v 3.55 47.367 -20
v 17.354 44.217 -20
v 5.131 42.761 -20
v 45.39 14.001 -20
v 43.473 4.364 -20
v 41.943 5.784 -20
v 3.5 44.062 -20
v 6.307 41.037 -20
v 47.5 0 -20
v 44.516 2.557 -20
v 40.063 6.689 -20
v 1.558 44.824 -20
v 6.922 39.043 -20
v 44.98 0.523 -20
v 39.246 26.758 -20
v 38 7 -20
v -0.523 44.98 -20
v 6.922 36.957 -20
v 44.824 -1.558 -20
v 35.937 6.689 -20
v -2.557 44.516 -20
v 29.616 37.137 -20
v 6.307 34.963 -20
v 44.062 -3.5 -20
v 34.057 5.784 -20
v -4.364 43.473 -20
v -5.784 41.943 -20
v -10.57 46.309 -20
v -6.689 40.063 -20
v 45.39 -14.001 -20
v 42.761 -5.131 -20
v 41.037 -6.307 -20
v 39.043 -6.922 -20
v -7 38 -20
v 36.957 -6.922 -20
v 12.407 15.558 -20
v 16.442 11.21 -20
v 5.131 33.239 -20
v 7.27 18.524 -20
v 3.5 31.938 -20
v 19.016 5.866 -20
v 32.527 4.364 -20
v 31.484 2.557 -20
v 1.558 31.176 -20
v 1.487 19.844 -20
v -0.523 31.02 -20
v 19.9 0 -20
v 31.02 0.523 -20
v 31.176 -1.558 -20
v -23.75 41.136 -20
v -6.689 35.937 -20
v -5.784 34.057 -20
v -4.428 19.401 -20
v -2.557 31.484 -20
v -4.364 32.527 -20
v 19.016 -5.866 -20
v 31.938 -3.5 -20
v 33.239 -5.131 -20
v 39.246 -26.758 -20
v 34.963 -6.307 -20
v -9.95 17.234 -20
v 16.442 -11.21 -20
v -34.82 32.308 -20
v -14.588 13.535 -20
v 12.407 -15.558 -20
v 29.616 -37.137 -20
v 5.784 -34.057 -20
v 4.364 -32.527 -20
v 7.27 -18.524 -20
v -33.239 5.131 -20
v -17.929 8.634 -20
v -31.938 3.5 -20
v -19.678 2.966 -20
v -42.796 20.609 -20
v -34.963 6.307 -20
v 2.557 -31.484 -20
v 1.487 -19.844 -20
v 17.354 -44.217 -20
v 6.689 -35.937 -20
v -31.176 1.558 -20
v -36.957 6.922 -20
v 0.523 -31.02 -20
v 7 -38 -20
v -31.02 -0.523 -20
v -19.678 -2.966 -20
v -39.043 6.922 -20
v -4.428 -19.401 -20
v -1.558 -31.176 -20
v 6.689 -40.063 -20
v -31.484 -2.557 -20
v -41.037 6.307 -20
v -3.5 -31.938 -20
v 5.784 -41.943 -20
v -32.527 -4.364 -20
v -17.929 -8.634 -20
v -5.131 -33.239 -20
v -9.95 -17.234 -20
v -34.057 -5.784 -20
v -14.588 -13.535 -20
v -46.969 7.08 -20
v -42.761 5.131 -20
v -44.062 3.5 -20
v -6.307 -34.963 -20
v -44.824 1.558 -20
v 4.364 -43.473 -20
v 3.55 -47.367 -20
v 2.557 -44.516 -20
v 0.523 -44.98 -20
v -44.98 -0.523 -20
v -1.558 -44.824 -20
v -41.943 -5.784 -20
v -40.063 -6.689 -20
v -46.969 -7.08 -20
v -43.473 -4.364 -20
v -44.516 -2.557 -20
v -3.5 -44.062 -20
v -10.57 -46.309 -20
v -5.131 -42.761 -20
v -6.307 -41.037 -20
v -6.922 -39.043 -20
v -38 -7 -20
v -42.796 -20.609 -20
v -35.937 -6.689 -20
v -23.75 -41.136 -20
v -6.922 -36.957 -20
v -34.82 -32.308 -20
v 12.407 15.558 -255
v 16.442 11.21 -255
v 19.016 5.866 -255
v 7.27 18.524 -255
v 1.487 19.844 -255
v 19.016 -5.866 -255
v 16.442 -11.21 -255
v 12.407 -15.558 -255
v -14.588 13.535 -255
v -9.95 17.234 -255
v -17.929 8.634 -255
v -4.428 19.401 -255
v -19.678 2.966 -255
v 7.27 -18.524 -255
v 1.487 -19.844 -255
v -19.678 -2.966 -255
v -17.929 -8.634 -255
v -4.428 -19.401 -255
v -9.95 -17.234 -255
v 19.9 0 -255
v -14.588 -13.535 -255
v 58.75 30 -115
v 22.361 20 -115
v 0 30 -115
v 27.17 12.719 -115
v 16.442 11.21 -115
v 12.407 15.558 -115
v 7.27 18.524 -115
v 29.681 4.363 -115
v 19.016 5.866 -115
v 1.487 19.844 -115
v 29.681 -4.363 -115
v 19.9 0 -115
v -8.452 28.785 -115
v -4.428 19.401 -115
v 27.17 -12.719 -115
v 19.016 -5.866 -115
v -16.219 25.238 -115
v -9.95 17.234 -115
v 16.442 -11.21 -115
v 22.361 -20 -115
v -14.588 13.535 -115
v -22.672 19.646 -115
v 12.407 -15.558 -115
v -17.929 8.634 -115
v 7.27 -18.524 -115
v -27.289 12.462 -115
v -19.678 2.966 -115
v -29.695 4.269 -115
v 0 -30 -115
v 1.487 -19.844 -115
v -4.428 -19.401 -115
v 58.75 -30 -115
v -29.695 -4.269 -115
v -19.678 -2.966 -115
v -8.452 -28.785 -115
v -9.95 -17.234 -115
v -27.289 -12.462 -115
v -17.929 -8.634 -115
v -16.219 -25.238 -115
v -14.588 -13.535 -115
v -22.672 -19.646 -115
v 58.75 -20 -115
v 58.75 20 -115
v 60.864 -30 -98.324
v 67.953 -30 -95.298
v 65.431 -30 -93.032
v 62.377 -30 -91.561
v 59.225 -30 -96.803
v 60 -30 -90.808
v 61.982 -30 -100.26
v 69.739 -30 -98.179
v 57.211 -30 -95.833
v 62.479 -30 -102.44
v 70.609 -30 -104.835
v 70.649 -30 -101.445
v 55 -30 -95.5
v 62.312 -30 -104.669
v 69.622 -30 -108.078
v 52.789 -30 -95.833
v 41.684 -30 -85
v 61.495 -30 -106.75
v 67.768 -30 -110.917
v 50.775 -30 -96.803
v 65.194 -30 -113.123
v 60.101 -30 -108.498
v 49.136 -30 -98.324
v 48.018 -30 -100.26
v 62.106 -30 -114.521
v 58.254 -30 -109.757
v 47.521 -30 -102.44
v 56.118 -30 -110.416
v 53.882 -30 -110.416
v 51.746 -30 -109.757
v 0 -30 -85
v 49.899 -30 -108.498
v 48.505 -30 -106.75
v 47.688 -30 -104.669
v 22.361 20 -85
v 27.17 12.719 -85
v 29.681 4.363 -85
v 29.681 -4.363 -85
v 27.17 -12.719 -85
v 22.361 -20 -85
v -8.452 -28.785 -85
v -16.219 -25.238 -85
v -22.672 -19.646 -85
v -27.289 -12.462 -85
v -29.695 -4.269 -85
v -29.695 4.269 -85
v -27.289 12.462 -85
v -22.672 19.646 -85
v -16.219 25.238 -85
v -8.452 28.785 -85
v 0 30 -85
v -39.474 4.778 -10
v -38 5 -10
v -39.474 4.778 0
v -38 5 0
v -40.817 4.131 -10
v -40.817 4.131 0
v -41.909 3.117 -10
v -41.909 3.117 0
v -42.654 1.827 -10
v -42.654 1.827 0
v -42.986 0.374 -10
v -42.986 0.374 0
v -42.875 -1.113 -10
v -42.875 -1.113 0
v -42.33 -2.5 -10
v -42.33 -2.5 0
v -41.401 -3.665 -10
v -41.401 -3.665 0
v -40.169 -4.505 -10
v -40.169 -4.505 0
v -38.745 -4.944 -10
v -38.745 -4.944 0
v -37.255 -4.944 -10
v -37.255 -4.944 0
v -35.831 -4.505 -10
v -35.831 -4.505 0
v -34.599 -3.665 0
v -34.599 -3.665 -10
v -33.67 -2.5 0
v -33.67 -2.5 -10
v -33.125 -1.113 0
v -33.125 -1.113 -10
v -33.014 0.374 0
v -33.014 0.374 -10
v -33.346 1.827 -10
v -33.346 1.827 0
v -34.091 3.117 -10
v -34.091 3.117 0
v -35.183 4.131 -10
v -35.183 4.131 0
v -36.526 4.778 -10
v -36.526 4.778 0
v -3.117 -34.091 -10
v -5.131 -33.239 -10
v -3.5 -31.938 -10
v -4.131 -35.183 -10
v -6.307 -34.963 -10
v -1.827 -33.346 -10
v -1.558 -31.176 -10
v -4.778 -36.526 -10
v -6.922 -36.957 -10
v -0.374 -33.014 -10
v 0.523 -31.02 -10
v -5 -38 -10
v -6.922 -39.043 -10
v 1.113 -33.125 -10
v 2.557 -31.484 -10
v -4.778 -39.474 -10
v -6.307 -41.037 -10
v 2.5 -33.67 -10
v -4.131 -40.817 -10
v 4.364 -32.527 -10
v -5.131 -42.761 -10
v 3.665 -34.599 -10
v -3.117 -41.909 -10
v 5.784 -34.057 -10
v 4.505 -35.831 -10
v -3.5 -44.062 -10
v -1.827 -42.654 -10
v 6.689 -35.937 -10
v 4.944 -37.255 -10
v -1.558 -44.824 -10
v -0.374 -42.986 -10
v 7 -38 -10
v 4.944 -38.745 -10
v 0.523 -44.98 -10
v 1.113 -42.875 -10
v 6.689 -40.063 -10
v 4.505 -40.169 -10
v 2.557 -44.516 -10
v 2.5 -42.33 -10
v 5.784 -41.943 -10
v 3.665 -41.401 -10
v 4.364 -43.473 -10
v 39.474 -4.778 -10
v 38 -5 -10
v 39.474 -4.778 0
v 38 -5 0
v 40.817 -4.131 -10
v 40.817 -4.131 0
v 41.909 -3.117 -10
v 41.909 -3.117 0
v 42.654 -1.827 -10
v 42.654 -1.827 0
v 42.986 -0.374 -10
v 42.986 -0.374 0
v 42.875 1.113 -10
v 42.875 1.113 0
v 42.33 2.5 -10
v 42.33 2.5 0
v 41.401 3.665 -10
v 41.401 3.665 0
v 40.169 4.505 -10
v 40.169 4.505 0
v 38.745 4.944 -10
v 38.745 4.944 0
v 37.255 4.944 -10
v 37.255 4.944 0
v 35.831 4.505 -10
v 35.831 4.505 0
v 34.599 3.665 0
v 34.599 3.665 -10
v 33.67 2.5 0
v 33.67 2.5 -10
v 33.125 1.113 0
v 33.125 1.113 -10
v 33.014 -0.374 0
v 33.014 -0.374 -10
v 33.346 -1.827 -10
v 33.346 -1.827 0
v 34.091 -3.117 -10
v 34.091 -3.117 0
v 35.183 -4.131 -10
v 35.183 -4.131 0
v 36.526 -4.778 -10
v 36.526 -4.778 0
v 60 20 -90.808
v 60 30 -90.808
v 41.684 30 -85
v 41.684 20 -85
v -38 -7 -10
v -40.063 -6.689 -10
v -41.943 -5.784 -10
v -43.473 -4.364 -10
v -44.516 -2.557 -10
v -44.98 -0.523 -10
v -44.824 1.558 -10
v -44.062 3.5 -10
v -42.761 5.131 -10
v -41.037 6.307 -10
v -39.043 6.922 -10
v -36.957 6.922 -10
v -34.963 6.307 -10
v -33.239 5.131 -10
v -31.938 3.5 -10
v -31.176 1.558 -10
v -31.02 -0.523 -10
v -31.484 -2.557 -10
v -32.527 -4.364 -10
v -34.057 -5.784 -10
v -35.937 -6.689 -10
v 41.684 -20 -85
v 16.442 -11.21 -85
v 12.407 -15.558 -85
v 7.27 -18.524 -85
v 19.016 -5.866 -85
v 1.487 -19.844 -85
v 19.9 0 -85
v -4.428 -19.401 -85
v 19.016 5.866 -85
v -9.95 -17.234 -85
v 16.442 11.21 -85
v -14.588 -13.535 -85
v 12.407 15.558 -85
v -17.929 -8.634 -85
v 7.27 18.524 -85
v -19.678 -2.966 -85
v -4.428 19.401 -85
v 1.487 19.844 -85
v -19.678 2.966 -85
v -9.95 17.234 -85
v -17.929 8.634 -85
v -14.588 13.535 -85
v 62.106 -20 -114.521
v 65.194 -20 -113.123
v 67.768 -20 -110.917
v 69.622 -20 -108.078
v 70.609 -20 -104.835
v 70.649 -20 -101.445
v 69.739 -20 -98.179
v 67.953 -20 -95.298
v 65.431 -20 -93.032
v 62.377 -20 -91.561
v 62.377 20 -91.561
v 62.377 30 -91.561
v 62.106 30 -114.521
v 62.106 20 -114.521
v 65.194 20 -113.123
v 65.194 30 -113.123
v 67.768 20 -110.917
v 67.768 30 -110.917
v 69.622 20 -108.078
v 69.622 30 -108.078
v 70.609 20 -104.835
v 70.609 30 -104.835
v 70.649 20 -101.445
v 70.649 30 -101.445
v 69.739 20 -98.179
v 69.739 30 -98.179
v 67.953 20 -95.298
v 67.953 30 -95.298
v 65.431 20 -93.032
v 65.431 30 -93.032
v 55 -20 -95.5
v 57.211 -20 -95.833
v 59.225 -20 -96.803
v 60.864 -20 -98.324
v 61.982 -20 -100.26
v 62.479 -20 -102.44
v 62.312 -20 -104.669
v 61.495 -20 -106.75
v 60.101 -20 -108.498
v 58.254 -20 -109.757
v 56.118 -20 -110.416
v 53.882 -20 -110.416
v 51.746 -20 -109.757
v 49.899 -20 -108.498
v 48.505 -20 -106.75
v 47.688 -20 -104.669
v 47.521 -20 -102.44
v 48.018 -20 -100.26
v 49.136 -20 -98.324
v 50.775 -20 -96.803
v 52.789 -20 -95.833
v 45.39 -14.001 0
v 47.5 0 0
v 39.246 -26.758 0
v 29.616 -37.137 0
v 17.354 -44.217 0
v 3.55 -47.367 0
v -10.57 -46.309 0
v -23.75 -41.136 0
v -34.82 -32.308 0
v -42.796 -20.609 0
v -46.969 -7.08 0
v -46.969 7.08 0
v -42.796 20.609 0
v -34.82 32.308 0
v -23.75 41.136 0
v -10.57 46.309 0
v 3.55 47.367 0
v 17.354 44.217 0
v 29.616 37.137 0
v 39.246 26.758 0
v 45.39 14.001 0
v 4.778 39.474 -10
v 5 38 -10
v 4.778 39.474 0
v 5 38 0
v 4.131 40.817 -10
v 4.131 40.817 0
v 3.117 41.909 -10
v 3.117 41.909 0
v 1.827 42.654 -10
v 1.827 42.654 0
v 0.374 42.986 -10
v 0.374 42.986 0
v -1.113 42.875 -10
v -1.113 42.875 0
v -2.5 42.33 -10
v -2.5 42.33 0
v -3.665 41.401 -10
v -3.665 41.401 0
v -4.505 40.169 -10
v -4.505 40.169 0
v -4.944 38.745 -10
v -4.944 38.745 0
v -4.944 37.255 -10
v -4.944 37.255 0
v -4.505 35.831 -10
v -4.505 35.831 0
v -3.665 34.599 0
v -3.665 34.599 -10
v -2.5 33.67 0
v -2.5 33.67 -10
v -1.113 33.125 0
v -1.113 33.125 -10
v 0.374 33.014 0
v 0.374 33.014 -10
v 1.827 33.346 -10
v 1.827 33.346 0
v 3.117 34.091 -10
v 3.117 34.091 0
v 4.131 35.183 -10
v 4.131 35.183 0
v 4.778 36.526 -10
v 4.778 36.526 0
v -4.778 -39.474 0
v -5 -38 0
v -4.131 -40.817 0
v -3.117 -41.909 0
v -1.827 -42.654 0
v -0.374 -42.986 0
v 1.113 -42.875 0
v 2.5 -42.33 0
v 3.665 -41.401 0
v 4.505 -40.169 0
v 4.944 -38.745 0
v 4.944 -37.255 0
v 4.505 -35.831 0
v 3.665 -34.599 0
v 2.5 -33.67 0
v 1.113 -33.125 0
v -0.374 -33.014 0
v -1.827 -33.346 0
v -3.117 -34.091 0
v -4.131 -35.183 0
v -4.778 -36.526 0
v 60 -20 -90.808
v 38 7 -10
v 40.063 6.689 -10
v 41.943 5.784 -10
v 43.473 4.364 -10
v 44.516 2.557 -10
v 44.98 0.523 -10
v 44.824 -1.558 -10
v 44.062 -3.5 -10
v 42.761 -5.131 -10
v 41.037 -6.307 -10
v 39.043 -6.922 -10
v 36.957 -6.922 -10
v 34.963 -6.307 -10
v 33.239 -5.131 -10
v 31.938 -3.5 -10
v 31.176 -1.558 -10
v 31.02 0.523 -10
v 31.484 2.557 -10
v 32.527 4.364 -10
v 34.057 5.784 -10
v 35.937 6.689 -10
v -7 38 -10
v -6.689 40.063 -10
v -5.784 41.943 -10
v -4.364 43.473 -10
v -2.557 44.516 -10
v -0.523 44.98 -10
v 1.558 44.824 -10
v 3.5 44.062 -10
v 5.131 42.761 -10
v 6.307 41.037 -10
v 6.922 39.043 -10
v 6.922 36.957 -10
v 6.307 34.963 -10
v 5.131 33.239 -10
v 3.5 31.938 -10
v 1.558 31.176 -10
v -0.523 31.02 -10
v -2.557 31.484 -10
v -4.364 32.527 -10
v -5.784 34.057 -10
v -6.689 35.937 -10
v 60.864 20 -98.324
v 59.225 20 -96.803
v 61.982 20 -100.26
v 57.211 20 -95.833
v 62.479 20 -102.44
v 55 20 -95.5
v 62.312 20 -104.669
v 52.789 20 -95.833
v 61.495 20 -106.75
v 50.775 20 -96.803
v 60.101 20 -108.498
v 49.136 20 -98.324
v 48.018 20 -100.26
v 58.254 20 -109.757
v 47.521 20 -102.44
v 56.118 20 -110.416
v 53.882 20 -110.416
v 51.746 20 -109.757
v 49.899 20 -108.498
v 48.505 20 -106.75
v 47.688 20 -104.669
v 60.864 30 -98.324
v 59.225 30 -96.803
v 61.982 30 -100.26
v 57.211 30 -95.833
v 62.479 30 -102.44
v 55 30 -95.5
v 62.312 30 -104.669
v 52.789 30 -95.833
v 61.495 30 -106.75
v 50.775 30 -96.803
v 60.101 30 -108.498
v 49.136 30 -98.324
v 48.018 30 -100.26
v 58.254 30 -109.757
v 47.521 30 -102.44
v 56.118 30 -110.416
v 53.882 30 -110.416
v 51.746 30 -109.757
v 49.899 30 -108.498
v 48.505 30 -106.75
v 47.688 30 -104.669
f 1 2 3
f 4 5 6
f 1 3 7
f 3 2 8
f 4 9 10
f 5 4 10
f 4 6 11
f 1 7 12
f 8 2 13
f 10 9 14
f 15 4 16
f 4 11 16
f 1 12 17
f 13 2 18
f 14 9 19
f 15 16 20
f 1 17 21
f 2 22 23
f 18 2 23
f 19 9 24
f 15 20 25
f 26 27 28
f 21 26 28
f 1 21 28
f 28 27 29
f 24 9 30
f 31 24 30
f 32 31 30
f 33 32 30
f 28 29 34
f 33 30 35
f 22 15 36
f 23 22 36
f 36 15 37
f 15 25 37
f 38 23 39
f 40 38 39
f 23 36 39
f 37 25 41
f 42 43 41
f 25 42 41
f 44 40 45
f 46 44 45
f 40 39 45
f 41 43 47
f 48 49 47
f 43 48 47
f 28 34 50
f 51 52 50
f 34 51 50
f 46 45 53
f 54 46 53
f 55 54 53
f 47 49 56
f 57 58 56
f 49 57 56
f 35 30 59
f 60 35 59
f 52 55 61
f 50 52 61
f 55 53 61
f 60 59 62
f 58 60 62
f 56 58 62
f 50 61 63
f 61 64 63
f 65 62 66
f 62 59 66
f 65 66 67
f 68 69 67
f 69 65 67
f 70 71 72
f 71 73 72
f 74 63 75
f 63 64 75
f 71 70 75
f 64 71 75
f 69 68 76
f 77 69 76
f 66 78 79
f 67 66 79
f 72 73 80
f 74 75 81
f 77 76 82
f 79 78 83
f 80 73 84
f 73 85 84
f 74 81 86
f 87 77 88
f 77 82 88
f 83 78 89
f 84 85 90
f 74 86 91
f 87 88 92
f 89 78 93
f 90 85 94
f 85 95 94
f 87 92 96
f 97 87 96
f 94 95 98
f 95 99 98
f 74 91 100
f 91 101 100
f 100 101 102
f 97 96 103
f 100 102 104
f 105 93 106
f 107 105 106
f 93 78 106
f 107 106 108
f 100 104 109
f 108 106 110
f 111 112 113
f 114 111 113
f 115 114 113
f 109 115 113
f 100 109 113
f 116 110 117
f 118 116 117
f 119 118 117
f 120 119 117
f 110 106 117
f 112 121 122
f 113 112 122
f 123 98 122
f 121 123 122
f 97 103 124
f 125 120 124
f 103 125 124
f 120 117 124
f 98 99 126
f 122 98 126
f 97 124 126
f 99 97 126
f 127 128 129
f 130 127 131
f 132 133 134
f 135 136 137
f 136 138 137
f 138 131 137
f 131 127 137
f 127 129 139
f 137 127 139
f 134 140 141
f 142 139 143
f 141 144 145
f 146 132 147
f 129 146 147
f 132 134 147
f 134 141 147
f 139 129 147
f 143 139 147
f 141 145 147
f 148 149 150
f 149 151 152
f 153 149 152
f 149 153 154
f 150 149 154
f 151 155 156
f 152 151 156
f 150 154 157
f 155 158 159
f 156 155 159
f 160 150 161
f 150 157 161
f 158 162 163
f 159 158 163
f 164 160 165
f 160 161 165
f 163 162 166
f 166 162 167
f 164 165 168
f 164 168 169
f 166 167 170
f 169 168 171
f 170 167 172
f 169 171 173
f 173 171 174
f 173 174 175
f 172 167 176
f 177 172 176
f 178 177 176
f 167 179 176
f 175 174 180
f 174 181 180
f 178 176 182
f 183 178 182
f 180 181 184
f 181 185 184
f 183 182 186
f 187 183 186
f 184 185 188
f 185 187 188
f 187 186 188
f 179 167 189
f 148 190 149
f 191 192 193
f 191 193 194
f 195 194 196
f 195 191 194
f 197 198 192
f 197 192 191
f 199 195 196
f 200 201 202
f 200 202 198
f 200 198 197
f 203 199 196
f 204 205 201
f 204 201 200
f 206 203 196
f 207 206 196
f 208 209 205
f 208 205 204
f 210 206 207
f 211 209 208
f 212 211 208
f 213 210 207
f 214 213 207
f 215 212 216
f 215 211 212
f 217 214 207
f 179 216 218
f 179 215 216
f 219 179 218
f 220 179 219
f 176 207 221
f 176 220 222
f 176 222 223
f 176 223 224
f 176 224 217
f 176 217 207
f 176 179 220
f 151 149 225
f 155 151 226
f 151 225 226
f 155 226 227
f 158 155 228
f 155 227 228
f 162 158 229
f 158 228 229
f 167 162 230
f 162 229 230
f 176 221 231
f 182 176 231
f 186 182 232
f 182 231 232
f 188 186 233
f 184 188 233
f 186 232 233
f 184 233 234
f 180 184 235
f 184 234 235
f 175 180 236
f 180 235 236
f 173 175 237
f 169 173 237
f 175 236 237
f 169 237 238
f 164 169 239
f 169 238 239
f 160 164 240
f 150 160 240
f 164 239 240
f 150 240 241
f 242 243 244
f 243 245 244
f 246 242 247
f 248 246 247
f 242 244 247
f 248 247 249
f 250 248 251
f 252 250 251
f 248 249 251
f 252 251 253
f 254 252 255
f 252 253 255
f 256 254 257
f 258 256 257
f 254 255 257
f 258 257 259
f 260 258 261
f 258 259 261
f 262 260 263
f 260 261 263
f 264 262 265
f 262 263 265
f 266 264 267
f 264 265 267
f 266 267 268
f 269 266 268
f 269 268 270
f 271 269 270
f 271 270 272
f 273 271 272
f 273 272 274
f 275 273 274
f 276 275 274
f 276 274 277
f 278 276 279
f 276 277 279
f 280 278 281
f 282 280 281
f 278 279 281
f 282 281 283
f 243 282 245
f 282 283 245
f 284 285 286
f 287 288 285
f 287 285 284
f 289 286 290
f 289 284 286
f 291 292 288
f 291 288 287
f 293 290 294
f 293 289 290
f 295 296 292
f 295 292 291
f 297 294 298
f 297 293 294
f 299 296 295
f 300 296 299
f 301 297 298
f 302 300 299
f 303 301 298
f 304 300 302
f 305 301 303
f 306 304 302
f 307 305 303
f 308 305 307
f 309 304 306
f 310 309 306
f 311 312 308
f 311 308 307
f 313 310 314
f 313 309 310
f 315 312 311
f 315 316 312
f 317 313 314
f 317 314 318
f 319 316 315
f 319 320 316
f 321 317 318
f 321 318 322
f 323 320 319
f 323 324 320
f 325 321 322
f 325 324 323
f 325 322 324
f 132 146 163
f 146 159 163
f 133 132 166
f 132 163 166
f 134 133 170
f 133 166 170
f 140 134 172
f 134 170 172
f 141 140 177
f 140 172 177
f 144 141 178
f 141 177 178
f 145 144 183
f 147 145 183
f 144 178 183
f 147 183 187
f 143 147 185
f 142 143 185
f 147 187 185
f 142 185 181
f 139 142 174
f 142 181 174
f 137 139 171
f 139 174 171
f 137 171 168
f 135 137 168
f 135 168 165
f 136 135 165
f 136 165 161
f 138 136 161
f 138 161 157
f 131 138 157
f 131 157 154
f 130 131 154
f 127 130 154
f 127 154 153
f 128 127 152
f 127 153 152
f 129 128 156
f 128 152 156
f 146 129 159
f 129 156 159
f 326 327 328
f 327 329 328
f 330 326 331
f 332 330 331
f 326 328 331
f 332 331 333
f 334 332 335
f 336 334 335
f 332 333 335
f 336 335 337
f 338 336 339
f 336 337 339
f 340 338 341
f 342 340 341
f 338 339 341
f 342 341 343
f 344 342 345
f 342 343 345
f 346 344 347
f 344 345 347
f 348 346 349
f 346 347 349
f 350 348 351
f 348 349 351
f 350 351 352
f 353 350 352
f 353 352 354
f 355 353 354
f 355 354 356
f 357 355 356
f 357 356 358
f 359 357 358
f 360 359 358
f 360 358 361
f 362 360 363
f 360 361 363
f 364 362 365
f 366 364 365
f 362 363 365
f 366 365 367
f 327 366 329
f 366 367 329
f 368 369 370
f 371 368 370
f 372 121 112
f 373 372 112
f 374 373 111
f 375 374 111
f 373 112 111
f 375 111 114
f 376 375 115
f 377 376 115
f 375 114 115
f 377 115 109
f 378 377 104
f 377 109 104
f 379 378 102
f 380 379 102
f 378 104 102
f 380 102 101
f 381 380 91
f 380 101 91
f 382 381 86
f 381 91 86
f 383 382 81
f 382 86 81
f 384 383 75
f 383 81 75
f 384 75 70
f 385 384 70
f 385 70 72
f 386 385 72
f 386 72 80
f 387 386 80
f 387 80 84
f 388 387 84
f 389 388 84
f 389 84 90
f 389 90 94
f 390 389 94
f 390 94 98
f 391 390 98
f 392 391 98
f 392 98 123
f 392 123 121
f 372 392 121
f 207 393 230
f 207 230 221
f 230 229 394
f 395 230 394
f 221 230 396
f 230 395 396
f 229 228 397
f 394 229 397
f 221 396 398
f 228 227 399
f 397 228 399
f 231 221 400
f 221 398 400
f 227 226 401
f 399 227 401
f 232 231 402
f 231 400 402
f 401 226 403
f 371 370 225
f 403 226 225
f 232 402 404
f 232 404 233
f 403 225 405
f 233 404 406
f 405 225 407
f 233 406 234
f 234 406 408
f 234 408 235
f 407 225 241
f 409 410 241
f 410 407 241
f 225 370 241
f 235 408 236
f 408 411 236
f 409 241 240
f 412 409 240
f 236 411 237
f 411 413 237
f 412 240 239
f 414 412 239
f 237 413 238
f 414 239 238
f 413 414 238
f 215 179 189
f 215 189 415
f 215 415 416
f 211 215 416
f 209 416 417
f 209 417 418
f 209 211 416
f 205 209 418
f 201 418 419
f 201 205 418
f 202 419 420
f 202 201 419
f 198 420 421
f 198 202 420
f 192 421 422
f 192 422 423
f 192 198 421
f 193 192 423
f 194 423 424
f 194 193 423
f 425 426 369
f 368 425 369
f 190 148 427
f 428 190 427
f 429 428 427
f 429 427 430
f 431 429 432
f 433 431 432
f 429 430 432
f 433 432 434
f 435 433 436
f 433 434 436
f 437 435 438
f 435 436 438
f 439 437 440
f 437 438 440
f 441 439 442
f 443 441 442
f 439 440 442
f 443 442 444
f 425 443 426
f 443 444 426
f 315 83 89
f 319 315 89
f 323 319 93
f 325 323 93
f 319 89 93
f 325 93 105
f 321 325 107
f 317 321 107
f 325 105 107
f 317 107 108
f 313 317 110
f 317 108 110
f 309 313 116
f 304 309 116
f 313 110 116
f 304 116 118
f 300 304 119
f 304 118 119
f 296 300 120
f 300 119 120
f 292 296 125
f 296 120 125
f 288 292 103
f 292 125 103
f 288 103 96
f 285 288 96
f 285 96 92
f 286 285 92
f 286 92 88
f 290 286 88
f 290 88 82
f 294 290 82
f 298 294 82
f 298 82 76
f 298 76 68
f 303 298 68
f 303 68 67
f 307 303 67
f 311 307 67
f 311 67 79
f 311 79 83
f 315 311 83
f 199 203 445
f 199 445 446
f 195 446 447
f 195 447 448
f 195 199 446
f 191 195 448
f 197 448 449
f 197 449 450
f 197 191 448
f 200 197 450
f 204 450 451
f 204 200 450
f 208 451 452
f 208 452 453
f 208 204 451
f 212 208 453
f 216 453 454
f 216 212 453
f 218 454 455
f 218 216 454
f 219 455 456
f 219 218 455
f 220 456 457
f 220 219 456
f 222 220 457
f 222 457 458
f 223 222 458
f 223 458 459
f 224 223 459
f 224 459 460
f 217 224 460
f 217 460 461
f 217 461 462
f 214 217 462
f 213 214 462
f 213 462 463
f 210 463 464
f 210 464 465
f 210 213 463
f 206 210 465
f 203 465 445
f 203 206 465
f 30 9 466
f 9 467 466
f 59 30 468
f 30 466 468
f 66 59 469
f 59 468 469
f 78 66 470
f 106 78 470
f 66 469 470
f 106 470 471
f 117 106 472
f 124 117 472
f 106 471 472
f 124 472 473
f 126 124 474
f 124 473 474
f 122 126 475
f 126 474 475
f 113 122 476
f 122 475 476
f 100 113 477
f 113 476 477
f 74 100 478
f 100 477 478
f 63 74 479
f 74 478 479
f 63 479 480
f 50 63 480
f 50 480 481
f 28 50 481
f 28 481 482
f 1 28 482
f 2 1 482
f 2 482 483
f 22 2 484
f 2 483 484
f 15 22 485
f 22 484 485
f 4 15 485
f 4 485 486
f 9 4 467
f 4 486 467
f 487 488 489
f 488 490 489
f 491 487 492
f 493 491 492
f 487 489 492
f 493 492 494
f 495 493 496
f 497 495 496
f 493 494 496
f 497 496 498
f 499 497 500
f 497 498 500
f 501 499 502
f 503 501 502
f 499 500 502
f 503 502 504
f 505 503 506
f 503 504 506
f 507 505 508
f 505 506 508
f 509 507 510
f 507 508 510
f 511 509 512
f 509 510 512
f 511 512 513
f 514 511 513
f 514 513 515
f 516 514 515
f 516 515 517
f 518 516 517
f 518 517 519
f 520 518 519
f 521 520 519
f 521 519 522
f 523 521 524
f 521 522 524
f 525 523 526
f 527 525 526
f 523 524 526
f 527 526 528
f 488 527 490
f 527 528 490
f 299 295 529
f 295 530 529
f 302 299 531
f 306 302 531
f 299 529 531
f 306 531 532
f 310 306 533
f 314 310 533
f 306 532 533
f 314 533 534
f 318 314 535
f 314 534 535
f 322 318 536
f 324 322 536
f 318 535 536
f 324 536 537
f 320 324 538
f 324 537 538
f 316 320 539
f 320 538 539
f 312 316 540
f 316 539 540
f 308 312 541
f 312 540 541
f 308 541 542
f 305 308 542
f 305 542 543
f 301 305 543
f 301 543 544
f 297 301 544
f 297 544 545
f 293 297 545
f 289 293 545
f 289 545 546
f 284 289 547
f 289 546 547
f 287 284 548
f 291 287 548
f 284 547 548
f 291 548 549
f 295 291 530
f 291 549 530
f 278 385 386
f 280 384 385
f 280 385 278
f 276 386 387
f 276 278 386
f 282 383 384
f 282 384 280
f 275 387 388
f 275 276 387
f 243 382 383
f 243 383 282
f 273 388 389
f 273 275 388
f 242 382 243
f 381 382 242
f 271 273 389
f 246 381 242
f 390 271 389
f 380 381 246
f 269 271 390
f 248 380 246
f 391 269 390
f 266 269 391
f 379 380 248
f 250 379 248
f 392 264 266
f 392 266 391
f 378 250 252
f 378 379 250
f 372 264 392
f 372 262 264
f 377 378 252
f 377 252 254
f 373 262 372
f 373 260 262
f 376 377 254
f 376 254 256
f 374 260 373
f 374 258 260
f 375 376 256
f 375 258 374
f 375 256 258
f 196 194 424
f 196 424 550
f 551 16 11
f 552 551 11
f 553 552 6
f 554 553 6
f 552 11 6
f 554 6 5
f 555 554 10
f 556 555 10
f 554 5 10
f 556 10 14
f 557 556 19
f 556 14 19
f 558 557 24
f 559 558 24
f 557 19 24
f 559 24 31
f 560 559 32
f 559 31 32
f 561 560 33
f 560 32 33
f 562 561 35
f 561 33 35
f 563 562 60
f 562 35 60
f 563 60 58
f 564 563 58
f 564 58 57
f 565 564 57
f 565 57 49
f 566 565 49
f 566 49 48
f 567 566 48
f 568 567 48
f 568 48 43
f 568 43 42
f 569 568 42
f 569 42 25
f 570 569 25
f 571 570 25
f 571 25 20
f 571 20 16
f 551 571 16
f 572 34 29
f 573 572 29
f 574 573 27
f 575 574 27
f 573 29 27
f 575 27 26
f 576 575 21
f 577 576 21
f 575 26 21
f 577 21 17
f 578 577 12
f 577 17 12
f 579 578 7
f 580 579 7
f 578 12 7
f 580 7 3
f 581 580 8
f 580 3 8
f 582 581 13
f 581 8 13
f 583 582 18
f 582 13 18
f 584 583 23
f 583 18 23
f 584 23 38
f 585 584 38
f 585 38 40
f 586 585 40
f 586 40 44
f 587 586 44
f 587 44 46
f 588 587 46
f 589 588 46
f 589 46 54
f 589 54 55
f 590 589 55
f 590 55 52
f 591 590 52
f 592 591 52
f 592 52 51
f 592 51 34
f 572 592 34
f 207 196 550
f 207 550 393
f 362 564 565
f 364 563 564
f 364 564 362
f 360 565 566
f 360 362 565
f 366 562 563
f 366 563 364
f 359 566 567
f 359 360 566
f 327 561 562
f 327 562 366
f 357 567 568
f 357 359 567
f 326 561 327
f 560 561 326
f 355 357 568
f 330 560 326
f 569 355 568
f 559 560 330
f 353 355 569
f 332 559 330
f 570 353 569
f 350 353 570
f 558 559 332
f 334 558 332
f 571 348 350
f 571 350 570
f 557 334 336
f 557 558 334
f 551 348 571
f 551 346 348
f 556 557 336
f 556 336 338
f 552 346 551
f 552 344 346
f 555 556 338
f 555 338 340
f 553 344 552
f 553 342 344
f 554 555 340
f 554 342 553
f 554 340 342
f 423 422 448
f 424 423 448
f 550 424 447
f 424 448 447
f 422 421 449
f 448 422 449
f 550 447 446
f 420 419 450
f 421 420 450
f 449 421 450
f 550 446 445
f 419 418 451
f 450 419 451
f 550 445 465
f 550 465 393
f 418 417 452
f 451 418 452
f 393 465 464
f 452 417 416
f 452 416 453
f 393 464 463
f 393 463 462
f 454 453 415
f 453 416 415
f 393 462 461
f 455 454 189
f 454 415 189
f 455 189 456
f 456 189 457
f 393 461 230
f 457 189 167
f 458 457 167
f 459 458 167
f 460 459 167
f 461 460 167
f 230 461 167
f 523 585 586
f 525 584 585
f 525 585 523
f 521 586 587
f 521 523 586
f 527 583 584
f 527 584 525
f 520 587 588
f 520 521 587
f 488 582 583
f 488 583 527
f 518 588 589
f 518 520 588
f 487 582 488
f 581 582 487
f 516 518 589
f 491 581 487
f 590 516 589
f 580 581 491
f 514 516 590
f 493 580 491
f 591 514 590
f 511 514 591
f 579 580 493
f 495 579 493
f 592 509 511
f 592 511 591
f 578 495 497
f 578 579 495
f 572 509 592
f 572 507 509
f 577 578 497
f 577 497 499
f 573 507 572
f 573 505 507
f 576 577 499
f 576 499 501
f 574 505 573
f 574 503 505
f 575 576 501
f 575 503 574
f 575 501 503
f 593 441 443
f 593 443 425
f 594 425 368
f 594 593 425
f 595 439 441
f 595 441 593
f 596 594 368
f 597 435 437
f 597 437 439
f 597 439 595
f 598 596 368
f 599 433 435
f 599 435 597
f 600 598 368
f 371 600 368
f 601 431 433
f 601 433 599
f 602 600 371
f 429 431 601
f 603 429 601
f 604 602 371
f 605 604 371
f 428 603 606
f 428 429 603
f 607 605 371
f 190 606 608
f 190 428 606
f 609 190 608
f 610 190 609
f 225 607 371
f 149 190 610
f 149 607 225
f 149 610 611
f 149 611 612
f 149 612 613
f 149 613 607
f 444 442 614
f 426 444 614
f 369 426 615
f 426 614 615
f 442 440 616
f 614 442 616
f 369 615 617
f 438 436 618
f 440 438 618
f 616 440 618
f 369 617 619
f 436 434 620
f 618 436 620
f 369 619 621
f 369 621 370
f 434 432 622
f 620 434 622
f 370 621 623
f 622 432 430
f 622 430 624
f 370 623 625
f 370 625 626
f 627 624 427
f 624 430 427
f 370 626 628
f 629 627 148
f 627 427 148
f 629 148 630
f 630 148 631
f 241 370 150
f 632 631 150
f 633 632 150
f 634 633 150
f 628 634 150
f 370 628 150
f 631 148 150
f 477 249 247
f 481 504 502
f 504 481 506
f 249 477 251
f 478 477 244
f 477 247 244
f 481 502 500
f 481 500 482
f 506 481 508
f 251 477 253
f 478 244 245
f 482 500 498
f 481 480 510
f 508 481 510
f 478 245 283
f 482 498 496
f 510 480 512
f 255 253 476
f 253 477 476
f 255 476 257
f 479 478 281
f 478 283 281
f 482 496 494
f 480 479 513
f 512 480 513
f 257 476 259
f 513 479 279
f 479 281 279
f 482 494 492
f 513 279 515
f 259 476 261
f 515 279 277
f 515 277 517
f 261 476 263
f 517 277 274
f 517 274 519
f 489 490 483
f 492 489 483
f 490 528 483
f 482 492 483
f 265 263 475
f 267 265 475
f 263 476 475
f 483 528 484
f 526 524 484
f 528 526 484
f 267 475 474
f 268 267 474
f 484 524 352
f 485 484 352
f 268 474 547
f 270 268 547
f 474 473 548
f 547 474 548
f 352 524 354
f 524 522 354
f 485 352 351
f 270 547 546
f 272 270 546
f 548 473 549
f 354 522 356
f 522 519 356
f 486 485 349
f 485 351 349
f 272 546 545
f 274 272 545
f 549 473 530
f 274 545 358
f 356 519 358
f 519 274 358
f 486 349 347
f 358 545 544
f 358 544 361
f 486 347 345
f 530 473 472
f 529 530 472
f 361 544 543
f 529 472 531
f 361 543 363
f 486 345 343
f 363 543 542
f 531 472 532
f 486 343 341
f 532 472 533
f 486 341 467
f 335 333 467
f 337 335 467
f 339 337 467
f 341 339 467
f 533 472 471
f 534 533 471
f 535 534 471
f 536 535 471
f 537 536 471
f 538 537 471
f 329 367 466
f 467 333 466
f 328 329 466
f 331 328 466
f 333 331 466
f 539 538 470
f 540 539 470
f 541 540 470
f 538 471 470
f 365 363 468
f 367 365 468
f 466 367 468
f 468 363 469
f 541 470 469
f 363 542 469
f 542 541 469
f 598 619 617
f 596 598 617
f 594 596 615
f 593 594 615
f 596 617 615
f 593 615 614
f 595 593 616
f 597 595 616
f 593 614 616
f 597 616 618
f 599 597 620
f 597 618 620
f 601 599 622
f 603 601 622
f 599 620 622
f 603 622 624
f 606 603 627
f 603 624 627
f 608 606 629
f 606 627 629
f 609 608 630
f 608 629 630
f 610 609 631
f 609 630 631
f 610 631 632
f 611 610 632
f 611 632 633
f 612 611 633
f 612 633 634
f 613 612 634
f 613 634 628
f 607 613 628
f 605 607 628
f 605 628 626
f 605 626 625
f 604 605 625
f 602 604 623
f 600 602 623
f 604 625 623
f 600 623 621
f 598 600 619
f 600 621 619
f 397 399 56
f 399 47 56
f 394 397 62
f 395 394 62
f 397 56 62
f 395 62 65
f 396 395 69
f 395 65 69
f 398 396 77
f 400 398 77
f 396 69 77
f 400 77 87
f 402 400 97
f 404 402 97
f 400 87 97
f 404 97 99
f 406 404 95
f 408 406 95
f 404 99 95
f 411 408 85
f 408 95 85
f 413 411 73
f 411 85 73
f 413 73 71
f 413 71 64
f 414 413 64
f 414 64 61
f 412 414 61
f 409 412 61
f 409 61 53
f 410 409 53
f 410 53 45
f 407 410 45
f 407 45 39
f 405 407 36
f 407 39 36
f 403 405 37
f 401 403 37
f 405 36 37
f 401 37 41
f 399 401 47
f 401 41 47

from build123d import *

# Parameters (mm, degrees)
SKETCH2_R                               = 7.5
BOSS_EXTRUDE1_DEPTH                     = 10
CBORE_FOR_M5_HEX_HEAD_BOLT1_D           = 10
CBORE_FOR_M5_HEX_HEAD_BOLT1_CBORE_D     = 14
CBORE_FOR_M5_HEX_HEAD_BOLT1_CBORE_DEPTH = 10
CIRPATTERN1_COUNT                       = 4


with BuildPart() as part:
    # Sketch1 → Revolve1 (revolve)
    with BuildSketch(Plane(origin=(0, 0, 0), x_dir=(1, 0, 0), z_dir=(0, 1, 0))):
        Polygon((0, 255), (19.9, 255), (19.9, 115), (30, 115), (30, 85), (19.9, 85), (19.9, 20), (47.5, 20), (47.5, 0), (0, 0), align=None)
    revolve(axis=Axis((0, 0, 0), (0, 0, -1)))

    # Sketch2 → Boss-Extrude1 (add)
    with BuildSketch(Plane(origin=(0, 30, 0), x_dir=(1, 0, 0), z_dir=(0, 1, 0))):
        with BuildLine():
            Line((0, 115), (58.75, 115))
            ThreePointArc((58.75, 115), (70.608856816, 104.835079022), (62.376989895, 91.561252503))
            Line((62.376989895, 91.561252503), (60, 90.807558243))
            Line((60, 90.807558243), (41.684208051, 85))
            Line((41.684208051, 85), (30, 85))
            Line((30, 85), (0, 85))
            Line((0, 85), (0, 115))
        make_face()
        with Locations(Location((55, 103, 0), (0, 0, 270))):
            Circle(SKETCH2_R, mode=Mode.SUBTRACT)
    boss_extrude1 = extrude(amount=-BOSS_EXTRUDE1_DEPTH)

    # Mirror1: Boss-Extrude1 across plane
    add(boss_extrude1.mirror(Plane.ZX))

    # CBORE for M5 Hex Head Bolt1 (through all)
    with Locations(Plane(origin=(0, 0, -20), x_dir=(-1, 0, 0), z_dir=(0, 0, -1))):
        with Locations((0, 38)):
            cbore_for_m5_hex_head_bolt1 = CounterBoreHole(CBORE_FOR_M5_HEX_HEAD_BOLT1_D / 2, CBORE_FOR_M5_HEX_HEAD_BOLT1_CBORE_D / 2, CBORE_FOR_M5_HEX_HEAD_BOLT1_CBORE_DEPTH)

    # CirPattern1: CBORE for M5 Hex Head Bolt1 ×4 about axis
    cirpattern1_axis = Axis((0, 0, 0), (0, 0, 1))
    for i in range(1, CIRPATTERN1_COUNT):
        add(cbore_for_m5_hex_head_bolt1.rotate(cirpattern1_axis, i * 360 / CIRPATTERN1_COUNT), mode=Mode.SUBTRACT)


solid = part.part
